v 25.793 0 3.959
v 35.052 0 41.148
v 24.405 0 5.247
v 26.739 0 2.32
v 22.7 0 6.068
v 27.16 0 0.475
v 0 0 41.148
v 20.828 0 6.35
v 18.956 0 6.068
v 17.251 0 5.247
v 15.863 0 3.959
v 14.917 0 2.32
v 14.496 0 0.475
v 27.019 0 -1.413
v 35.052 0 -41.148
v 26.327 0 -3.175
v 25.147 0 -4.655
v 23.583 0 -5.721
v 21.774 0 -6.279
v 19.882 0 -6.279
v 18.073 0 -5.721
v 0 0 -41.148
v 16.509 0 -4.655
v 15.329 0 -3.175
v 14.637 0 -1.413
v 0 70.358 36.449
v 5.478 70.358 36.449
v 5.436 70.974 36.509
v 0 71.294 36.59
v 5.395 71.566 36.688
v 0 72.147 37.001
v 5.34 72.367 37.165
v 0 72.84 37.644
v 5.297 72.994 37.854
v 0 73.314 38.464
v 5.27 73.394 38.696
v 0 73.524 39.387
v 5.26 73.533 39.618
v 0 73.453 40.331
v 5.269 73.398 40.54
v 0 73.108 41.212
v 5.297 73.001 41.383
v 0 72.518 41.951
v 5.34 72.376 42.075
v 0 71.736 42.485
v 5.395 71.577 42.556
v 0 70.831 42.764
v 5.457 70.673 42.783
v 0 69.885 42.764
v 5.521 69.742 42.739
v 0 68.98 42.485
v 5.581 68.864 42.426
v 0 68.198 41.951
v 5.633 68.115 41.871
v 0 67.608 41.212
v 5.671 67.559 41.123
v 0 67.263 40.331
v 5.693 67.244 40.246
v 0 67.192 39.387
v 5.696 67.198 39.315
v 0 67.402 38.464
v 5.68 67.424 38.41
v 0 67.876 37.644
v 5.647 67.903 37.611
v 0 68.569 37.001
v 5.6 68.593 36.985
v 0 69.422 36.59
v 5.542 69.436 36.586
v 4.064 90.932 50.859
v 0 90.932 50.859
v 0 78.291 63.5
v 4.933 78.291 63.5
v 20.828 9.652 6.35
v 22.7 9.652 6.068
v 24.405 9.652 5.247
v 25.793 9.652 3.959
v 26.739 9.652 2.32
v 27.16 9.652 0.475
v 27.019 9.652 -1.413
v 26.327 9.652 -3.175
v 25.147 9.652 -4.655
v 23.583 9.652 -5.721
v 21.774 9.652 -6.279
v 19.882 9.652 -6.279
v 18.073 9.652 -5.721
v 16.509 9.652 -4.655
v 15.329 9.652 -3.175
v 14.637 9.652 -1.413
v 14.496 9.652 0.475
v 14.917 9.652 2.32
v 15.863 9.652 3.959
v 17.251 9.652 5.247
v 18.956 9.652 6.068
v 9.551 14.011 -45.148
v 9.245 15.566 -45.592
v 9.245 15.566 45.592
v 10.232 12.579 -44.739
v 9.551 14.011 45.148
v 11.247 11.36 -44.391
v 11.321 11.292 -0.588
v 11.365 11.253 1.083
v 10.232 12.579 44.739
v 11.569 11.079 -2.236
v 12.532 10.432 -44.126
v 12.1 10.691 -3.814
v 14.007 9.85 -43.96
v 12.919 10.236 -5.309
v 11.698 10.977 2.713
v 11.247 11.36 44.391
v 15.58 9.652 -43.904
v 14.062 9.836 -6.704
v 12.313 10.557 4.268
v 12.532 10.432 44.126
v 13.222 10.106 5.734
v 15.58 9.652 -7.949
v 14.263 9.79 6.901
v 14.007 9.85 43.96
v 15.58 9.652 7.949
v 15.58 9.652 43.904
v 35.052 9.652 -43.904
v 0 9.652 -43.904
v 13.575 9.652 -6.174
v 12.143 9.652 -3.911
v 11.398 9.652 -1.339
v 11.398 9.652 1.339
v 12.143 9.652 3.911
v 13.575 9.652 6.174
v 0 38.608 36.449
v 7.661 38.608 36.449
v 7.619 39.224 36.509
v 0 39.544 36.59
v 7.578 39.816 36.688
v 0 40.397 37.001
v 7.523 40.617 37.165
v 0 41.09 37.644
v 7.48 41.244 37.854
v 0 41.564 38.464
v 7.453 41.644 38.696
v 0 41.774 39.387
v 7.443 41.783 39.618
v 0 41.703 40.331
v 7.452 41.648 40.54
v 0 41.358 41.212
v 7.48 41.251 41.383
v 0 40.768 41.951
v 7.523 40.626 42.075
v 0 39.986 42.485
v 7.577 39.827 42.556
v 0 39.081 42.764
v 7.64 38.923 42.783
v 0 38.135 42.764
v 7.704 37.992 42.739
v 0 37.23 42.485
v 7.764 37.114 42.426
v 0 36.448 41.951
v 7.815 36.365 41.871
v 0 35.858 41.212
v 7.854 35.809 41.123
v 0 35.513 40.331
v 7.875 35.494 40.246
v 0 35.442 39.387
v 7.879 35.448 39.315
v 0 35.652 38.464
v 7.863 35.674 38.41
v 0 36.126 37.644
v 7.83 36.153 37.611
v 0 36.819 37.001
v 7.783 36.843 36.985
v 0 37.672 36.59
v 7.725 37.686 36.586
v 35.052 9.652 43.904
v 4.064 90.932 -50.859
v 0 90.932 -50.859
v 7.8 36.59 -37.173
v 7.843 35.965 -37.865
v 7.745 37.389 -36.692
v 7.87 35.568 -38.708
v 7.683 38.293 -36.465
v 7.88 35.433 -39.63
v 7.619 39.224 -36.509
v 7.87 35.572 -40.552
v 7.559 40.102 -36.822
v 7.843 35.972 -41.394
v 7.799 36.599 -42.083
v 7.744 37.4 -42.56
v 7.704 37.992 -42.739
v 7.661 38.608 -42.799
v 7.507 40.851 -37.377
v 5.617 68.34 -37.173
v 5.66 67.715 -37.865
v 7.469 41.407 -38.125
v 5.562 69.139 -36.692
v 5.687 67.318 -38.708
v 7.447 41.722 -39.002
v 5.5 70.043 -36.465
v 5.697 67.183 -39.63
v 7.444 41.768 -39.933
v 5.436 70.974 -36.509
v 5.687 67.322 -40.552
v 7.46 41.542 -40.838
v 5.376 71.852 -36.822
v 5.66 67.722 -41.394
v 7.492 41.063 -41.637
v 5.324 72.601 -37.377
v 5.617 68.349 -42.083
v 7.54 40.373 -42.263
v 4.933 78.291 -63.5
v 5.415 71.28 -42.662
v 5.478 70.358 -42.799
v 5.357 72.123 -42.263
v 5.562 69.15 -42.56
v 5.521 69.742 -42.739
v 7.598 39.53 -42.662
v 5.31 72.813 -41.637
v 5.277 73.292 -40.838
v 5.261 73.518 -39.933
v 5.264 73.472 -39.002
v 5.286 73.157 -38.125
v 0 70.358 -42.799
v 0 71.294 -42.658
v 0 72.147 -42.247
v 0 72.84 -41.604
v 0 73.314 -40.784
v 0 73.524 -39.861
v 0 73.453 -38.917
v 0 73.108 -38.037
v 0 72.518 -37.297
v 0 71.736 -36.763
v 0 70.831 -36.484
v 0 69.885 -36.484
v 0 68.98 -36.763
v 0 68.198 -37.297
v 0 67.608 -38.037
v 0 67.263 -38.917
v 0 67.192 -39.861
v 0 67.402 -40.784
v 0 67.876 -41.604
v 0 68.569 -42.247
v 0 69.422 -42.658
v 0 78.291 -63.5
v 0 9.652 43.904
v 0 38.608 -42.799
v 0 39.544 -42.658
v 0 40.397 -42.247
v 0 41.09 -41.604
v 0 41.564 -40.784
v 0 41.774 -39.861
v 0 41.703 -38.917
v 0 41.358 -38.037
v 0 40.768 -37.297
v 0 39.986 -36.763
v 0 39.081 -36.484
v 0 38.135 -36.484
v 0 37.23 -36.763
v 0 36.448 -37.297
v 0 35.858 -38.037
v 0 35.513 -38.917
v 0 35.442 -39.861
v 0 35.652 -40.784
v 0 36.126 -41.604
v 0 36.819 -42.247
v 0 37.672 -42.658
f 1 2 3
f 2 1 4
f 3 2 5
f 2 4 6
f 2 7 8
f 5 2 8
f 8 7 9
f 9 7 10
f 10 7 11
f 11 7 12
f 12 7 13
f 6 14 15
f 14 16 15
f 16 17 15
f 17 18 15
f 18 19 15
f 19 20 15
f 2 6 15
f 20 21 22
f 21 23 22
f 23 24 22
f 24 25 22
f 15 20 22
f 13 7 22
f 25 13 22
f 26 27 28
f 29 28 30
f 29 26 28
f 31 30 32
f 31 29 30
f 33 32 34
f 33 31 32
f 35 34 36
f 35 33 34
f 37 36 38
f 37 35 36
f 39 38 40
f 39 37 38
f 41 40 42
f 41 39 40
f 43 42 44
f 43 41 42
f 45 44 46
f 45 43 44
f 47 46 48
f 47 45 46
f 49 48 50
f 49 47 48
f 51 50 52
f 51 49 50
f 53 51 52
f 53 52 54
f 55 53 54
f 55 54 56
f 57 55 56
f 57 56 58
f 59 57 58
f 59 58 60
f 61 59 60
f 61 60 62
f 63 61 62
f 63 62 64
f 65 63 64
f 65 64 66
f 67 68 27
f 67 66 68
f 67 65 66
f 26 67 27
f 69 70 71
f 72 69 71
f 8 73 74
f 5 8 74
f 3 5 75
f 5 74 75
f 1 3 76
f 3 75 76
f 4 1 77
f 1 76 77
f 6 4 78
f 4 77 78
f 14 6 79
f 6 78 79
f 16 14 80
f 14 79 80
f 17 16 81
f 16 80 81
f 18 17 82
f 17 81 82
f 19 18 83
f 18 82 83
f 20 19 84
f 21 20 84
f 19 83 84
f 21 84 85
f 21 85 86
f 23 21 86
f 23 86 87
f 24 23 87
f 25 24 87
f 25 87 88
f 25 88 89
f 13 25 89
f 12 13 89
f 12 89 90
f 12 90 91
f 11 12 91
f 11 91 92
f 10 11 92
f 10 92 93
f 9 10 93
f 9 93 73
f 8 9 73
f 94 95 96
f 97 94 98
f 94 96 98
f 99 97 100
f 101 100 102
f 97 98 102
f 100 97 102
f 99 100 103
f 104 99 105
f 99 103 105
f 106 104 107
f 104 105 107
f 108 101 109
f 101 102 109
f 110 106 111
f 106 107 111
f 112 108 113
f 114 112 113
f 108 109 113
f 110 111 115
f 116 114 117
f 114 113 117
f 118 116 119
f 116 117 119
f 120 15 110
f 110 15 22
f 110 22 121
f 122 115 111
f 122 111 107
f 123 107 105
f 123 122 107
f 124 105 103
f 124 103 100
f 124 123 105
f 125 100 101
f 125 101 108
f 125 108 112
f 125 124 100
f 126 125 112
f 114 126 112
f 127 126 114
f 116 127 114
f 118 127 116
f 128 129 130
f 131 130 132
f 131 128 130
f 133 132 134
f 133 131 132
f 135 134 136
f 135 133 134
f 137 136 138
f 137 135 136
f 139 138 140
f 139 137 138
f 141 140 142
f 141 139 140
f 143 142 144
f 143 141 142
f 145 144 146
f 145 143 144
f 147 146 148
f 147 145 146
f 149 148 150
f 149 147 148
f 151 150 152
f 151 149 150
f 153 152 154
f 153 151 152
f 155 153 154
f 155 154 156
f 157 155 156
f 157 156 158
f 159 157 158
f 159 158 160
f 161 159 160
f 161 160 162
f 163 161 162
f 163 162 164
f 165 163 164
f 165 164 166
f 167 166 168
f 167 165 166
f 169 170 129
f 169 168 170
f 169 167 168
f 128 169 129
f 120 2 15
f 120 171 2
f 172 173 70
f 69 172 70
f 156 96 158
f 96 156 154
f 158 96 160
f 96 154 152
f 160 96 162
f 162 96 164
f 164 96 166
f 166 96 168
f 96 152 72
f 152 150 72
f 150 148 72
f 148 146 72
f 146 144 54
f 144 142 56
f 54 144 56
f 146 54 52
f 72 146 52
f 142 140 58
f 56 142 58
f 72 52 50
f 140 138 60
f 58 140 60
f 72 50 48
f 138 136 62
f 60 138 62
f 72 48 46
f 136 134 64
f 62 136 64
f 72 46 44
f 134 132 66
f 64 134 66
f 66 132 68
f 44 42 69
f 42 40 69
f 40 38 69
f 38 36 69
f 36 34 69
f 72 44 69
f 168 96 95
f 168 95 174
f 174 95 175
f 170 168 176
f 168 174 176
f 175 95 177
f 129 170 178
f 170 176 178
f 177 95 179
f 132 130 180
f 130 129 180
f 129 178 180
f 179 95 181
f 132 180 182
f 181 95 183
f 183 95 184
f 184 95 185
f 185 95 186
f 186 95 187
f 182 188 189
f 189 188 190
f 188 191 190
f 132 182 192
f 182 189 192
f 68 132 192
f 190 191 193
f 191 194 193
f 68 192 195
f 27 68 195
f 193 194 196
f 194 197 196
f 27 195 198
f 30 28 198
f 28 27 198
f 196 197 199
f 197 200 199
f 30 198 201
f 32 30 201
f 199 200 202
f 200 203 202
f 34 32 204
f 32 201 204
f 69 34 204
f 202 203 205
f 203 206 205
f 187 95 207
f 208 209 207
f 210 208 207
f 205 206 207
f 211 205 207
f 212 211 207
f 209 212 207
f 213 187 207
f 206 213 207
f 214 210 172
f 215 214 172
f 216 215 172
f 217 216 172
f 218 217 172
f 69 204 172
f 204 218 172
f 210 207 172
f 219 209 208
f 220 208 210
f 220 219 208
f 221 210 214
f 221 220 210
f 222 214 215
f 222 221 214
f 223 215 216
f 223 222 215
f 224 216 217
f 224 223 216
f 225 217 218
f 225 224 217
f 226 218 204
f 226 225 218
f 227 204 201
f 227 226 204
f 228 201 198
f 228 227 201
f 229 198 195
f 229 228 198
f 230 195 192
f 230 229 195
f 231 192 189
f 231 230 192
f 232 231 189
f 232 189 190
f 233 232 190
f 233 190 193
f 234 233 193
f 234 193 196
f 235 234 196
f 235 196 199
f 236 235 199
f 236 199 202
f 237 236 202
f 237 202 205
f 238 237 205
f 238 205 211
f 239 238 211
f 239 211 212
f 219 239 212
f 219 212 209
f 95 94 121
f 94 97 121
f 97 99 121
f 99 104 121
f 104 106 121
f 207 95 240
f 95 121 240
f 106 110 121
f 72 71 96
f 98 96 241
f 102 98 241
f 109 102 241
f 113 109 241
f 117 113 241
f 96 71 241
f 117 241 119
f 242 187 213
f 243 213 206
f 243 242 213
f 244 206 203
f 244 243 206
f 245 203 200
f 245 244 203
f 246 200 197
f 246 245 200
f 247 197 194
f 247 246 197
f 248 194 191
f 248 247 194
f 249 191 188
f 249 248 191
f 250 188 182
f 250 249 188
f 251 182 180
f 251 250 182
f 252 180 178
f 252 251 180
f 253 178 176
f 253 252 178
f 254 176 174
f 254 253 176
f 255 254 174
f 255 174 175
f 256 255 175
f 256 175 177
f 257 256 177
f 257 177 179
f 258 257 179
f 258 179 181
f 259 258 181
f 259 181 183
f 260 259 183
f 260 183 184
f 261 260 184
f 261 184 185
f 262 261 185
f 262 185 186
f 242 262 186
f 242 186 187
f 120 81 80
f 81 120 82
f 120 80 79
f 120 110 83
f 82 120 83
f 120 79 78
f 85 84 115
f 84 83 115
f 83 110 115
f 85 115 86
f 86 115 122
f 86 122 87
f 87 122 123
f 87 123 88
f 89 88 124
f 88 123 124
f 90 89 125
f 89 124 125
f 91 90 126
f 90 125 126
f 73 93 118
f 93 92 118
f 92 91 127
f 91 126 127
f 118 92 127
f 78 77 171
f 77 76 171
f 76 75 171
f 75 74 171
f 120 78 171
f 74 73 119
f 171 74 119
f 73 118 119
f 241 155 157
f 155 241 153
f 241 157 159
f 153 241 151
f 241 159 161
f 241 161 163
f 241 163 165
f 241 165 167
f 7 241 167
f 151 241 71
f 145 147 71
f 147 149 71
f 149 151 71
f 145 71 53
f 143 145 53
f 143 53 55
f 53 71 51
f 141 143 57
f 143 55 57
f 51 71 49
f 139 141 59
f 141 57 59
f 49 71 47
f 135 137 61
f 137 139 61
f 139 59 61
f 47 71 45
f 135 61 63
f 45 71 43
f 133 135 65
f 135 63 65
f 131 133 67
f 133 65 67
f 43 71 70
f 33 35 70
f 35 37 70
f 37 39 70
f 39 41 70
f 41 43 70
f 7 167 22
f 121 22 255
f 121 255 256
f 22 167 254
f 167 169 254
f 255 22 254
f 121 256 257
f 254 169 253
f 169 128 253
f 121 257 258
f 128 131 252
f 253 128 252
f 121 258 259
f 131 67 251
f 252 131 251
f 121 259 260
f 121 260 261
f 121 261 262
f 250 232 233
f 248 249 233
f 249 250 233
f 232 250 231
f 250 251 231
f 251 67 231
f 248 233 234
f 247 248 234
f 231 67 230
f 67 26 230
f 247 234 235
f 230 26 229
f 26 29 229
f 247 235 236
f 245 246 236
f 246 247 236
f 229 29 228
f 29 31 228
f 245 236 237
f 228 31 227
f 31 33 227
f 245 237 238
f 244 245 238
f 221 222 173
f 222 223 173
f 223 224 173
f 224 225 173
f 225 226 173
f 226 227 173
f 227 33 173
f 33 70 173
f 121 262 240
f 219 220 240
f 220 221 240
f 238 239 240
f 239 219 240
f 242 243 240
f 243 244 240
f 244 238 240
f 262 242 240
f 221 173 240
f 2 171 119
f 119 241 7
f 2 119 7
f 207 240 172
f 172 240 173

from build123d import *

# Parameters (mm, degrees)
SKETCH2_R               = 3.175
BOSS_EXTRUDE1_DEPTH     = 9.652
BOSS_EXTRUDE2_DEPTH     = 35.052
CUT_EXTRUDE1_DEPTH      = 117.316470579
CUT_EXTRUDE1_DEPTH_BACK = 117.316470579
FILLET1_R               = 6.35
CUT_EXTRUDE3_DEPTH      = 109.937280598
CUT_EXTRUDE3_DEPTH_BACK = 109.937280598
SKETCH5_R               = 6.35
SKETCH6_R               = 9.525
CUT_EXTRUDE4_DEPTH      = 109.937280598


with BuildPart() as part:
    # Sketch2 → Boss-Extrude1 (new body)
    with BuildSketch(Plane(origin=(0, 0, 0), x_dir=(0, 0, -1), z_dir=(1, 0, 0))):
        Polygon((41.148, 0), (63.5, 78.2912287), (50.8592287, 90.932), (-50.8592287, 90.932), (-63.5, 78.2912287), (-41.148, 0), align=None)
        with Locations((39.624, 70.358)):
            Circle(SKETCH2_R, mode=Mode.SUBTRACT)
        with Locations((39.624, 38.608)):
            Circle(SKETCH2_R, mode=Mode.SUBTRACT)
        with Locations((-39.624, 70.358)):
            Circle(SKETCH2_R, mode=Mode.SUBTRACT)
        with Locations((-39.624, 38.608)):
            Circle(SKETCH2_R, mode=Mode.SUBTRACT)
    extrude(amount=BOSS_EXTRUDE1_DEPTH)

    # Sketch2<6> → Boss-Extrude2 (add)
    with BuildSketch(Plane(origin=(0, 0, 0), x_dir=(0, 0, -1), z_dir=(1, 0, 0))):
        Polygon((41.148, 0), (43.903628026, 9.652), (-43.903628026, 9.652), (-41.148, 0), align=None)
    extrude(amount=BOSS_EXTRUDE2_DEPTH)

    # Sketch4 → Cut-Extrude1 (cut, two sides: drawn at the far end of the back side and taken through both)
    with BuildSketch(Plane.XY.offset(-CUT_EXTRUDE1_DEPTH_BACK)):
        Polygon((9.652, 9.652), (4.064, 90.932), (9.652, 90.932), align=None)
    extrude(amount=CUT_EXTRUDE1_DEPTH + CUT_EXTRUDE1_DEPTH_BACK, mode=Mode.SUBTRACT)

    # Fillet1
    fillet1_edges = [part.edges().sort_by_distance(p)[0] for p in [
        (9.652, 9.652, 0),
    ]]
    fillet(fillet1_edges, radius=FILLET1_R)

    # Sketch5 → Cut-Extrude3 (cut, two sides: drawn at the far end of the back side and taken through both)
    with BuildSketch(Plane(origin=(0, 9.652, 0), x_dir=(1, 0, 0), z_dir=(0, 1, 0)).offset(-CUT_EXTRUDE3_DEPTH_BACK)):
        with Locations((20.828, 0)):
            Circle(SKETCH5_R)
    extrude(amount=CUT_EXTRUDE3_DEPTH + CUT_EXTRUDE3_DEPTH_BACK, mode=Mode.SUBTRACT)

    # Sketch6 → Cut-Extrude4 (cut, through all)
    with BuildSketch(Plane(origin=(0, 9.652, 0), x_dir=(1, 0, 0), z_dir=(0, 1, 0))):
        with Locations((20.828, 0)):
            Circle(SKETCH6_R)
    extrude(amount=CUT_EXTRUDE4_DEPTH, mode=Mode.SUBTRACT)


solid = part.part
